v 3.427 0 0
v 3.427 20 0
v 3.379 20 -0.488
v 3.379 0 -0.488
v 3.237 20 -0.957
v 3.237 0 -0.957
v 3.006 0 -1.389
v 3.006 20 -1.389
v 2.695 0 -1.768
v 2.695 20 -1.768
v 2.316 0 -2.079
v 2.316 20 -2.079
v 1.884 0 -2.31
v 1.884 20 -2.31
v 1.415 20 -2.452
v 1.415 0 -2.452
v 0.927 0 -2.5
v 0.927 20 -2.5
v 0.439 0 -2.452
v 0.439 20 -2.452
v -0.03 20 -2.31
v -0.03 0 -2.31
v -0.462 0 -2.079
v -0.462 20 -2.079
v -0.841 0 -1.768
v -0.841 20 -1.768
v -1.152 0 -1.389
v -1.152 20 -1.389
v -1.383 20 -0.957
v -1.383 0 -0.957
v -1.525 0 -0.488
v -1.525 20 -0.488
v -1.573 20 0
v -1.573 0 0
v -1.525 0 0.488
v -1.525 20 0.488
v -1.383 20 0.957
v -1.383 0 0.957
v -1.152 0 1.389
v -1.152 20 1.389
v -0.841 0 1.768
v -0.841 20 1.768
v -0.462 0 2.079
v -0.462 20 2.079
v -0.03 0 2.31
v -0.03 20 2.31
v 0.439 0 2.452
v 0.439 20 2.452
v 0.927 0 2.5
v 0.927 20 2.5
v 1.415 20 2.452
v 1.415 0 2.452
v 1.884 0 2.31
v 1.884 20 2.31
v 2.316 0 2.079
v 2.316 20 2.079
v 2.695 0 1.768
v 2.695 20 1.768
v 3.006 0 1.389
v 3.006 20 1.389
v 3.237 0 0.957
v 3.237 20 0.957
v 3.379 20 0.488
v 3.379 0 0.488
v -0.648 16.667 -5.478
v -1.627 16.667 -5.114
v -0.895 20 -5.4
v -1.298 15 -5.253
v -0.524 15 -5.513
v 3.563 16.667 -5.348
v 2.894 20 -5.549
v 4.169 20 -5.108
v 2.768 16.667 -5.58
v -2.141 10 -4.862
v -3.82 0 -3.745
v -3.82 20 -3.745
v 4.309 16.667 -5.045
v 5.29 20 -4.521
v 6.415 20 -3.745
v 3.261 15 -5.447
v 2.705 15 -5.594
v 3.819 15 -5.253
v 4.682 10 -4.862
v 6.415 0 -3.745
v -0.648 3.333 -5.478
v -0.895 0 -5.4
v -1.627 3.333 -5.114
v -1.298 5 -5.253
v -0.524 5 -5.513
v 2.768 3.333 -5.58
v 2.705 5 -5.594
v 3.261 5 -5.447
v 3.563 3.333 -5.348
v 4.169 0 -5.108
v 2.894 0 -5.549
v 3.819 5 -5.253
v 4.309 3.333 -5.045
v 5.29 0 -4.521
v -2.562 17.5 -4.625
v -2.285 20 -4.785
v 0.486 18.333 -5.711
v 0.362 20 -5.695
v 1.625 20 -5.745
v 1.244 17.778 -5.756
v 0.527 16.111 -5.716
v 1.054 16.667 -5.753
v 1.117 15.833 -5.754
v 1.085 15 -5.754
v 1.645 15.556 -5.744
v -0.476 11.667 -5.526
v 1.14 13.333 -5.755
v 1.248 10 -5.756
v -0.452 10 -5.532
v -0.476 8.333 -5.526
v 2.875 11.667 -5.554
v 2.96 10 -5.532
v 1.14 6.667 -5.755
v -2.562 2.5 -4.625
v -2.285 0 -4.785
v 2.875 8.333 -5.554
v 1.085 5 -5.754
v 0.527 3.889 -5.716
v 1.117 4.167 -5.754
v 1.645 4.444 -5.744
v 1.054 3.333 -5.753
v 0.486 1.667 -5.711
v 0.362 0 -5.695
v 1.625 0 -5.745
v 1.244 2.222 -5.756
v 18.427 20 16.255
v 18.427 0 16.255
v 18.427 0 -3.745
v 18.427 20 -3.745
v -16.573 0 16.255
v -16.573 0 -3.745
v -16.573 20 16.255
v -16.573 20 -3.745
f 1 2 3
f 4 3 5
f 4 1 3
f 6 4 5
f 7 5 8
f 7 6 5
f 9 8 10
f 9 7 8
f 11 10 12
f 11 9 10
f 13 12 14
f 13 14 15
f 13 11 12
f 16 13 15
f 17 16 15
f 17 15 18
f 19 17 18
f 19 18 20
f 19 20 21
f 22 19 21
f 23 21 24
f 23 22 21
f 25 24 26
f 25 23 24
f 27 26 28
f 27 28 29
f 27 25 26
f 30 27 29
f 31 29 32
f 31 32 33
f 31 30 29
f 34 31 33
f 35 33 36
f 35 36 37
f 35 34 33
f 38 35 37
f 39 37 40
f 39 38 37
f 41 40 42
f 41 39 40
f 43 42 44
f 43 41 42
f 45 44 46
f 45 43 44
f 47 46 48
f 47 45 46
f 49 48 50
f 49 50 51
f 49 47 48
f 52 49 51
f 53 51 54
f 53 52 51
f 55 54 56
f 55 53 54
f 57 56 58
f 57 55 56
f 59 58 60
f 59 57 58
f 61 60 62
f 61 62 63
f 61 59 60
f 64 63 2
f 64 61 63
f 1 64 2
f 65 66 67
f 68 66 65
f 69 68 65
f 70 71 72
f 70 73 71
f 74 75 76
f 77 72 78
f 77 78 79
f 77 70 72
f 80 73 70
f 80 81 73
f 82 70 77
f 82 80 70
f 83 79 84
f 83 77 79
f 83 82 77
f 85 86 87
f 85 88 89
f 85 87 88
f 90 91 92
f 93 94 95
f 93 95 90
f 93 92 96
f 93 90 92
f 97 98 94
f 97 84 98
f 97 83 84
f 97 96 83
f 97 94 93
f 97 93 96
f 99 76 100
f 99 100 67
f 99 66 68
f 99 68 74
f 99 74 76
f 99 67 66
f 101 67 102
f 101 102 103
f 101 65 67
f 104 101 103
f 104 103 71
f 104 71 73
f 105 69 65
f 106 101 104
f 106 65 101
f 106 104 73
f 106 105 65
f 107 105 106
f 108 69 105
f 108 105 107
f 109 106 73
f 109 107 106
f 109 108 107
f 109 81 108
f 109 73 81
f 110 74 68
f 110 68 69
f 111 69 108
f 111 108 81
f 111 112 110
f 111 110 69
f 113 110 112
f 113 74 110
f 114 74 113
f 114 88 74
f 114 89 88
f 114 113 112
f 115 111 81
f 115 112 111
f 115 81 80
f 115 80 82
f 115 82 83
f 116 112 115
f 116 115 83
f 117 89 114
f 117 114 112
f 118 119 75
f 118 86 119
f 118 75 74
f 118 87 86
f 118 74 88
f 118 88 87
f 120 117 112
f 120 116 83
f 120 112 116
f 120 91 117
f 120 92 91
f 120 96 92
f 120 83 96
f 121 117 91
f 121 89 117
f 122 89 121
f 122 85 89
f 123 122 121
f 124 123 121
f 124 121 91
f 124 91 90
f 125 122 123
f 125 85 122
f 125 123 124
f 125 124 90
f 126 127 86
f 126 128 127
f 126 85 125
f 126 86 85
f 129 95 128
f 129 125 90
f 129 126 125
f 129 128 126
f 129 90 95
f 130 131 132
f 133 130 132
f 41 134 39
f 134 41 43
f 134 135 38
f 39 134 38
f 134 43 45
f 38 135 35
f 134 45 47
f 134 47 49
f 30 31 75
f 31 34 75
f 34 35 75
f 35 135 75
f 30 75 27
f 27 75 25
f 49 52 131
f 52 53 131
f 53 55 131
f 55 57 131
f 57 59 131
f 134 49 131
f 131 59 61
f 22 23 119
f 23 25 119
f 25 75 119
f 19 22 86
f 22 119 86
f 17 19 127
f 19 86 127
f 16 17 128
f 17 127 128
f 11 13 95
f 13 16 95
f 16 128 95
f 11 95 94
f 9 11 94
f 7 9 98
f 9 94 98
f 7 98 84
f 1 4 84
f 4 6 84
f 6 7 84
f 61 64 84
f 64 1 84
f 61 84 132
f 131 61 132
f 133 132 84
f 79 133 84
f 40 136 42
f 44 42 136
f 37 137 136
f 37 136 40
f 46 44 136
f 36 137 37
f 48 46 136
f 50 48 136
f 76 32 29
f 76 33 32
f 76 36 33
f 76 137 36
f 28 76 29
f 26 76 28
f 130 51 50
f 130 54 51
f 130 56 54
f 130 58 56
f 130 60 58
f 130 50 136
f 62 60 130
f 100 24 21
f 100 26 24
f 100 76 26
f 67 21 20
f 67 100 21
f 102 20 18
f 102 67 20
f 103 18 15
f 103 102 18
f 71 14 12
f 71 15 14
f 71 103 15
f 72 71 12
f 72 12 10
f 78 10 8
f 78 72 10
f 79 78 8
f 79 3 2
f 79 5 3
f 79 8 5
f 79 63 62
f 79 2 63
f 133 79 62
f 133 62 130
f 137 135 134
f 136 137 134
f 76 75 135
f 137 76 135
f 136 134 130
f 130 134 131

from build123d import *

# Parameters (mm, degrees)
SKETCH1_R           = 2.5
BOSS_EXTRUDE1_DEPTH = 20


with BuildPart() as part:
    # Sketch1 → Boss-Extrude1 (new body)
    with BuildSketch(Plane(origin=(0, 0, 0), x_dir=(1, 0, 0), z_dir=(0, 1, 0))):
        with BuildLine():
            Line((-16.572928834, 3.745367509), (-16.572928834, -16.254632491))
            Line((-16.572928834, -16.254632491), (18.427071166, -16.254632491))
            Line((18.427071166, -16.254632491), (18.427071166, 3.745367509))
            Line((18.427071166, 3.745367509), (6.415332466, 3.745367509))
            add(Edge.make_bspline(
                [(-3.819533202, 3.745367509), (1.198635577, 7.766174081), (6.415332466, 3.745367509)],
                knots=[0, 0, 0, 1, 1, 1], degree=2))
            Line((-3.819533202, 3.745367509), (-16.572928834, 3.745367509))
        make_face()
        with Locations((0.927071166, 0)):
            Circle(SKETCH1_R, mode=Mode.SUBTRACT)
    extrude(amount=BOSS_EXTRUDE1_DEPTH)


solid = part.part
